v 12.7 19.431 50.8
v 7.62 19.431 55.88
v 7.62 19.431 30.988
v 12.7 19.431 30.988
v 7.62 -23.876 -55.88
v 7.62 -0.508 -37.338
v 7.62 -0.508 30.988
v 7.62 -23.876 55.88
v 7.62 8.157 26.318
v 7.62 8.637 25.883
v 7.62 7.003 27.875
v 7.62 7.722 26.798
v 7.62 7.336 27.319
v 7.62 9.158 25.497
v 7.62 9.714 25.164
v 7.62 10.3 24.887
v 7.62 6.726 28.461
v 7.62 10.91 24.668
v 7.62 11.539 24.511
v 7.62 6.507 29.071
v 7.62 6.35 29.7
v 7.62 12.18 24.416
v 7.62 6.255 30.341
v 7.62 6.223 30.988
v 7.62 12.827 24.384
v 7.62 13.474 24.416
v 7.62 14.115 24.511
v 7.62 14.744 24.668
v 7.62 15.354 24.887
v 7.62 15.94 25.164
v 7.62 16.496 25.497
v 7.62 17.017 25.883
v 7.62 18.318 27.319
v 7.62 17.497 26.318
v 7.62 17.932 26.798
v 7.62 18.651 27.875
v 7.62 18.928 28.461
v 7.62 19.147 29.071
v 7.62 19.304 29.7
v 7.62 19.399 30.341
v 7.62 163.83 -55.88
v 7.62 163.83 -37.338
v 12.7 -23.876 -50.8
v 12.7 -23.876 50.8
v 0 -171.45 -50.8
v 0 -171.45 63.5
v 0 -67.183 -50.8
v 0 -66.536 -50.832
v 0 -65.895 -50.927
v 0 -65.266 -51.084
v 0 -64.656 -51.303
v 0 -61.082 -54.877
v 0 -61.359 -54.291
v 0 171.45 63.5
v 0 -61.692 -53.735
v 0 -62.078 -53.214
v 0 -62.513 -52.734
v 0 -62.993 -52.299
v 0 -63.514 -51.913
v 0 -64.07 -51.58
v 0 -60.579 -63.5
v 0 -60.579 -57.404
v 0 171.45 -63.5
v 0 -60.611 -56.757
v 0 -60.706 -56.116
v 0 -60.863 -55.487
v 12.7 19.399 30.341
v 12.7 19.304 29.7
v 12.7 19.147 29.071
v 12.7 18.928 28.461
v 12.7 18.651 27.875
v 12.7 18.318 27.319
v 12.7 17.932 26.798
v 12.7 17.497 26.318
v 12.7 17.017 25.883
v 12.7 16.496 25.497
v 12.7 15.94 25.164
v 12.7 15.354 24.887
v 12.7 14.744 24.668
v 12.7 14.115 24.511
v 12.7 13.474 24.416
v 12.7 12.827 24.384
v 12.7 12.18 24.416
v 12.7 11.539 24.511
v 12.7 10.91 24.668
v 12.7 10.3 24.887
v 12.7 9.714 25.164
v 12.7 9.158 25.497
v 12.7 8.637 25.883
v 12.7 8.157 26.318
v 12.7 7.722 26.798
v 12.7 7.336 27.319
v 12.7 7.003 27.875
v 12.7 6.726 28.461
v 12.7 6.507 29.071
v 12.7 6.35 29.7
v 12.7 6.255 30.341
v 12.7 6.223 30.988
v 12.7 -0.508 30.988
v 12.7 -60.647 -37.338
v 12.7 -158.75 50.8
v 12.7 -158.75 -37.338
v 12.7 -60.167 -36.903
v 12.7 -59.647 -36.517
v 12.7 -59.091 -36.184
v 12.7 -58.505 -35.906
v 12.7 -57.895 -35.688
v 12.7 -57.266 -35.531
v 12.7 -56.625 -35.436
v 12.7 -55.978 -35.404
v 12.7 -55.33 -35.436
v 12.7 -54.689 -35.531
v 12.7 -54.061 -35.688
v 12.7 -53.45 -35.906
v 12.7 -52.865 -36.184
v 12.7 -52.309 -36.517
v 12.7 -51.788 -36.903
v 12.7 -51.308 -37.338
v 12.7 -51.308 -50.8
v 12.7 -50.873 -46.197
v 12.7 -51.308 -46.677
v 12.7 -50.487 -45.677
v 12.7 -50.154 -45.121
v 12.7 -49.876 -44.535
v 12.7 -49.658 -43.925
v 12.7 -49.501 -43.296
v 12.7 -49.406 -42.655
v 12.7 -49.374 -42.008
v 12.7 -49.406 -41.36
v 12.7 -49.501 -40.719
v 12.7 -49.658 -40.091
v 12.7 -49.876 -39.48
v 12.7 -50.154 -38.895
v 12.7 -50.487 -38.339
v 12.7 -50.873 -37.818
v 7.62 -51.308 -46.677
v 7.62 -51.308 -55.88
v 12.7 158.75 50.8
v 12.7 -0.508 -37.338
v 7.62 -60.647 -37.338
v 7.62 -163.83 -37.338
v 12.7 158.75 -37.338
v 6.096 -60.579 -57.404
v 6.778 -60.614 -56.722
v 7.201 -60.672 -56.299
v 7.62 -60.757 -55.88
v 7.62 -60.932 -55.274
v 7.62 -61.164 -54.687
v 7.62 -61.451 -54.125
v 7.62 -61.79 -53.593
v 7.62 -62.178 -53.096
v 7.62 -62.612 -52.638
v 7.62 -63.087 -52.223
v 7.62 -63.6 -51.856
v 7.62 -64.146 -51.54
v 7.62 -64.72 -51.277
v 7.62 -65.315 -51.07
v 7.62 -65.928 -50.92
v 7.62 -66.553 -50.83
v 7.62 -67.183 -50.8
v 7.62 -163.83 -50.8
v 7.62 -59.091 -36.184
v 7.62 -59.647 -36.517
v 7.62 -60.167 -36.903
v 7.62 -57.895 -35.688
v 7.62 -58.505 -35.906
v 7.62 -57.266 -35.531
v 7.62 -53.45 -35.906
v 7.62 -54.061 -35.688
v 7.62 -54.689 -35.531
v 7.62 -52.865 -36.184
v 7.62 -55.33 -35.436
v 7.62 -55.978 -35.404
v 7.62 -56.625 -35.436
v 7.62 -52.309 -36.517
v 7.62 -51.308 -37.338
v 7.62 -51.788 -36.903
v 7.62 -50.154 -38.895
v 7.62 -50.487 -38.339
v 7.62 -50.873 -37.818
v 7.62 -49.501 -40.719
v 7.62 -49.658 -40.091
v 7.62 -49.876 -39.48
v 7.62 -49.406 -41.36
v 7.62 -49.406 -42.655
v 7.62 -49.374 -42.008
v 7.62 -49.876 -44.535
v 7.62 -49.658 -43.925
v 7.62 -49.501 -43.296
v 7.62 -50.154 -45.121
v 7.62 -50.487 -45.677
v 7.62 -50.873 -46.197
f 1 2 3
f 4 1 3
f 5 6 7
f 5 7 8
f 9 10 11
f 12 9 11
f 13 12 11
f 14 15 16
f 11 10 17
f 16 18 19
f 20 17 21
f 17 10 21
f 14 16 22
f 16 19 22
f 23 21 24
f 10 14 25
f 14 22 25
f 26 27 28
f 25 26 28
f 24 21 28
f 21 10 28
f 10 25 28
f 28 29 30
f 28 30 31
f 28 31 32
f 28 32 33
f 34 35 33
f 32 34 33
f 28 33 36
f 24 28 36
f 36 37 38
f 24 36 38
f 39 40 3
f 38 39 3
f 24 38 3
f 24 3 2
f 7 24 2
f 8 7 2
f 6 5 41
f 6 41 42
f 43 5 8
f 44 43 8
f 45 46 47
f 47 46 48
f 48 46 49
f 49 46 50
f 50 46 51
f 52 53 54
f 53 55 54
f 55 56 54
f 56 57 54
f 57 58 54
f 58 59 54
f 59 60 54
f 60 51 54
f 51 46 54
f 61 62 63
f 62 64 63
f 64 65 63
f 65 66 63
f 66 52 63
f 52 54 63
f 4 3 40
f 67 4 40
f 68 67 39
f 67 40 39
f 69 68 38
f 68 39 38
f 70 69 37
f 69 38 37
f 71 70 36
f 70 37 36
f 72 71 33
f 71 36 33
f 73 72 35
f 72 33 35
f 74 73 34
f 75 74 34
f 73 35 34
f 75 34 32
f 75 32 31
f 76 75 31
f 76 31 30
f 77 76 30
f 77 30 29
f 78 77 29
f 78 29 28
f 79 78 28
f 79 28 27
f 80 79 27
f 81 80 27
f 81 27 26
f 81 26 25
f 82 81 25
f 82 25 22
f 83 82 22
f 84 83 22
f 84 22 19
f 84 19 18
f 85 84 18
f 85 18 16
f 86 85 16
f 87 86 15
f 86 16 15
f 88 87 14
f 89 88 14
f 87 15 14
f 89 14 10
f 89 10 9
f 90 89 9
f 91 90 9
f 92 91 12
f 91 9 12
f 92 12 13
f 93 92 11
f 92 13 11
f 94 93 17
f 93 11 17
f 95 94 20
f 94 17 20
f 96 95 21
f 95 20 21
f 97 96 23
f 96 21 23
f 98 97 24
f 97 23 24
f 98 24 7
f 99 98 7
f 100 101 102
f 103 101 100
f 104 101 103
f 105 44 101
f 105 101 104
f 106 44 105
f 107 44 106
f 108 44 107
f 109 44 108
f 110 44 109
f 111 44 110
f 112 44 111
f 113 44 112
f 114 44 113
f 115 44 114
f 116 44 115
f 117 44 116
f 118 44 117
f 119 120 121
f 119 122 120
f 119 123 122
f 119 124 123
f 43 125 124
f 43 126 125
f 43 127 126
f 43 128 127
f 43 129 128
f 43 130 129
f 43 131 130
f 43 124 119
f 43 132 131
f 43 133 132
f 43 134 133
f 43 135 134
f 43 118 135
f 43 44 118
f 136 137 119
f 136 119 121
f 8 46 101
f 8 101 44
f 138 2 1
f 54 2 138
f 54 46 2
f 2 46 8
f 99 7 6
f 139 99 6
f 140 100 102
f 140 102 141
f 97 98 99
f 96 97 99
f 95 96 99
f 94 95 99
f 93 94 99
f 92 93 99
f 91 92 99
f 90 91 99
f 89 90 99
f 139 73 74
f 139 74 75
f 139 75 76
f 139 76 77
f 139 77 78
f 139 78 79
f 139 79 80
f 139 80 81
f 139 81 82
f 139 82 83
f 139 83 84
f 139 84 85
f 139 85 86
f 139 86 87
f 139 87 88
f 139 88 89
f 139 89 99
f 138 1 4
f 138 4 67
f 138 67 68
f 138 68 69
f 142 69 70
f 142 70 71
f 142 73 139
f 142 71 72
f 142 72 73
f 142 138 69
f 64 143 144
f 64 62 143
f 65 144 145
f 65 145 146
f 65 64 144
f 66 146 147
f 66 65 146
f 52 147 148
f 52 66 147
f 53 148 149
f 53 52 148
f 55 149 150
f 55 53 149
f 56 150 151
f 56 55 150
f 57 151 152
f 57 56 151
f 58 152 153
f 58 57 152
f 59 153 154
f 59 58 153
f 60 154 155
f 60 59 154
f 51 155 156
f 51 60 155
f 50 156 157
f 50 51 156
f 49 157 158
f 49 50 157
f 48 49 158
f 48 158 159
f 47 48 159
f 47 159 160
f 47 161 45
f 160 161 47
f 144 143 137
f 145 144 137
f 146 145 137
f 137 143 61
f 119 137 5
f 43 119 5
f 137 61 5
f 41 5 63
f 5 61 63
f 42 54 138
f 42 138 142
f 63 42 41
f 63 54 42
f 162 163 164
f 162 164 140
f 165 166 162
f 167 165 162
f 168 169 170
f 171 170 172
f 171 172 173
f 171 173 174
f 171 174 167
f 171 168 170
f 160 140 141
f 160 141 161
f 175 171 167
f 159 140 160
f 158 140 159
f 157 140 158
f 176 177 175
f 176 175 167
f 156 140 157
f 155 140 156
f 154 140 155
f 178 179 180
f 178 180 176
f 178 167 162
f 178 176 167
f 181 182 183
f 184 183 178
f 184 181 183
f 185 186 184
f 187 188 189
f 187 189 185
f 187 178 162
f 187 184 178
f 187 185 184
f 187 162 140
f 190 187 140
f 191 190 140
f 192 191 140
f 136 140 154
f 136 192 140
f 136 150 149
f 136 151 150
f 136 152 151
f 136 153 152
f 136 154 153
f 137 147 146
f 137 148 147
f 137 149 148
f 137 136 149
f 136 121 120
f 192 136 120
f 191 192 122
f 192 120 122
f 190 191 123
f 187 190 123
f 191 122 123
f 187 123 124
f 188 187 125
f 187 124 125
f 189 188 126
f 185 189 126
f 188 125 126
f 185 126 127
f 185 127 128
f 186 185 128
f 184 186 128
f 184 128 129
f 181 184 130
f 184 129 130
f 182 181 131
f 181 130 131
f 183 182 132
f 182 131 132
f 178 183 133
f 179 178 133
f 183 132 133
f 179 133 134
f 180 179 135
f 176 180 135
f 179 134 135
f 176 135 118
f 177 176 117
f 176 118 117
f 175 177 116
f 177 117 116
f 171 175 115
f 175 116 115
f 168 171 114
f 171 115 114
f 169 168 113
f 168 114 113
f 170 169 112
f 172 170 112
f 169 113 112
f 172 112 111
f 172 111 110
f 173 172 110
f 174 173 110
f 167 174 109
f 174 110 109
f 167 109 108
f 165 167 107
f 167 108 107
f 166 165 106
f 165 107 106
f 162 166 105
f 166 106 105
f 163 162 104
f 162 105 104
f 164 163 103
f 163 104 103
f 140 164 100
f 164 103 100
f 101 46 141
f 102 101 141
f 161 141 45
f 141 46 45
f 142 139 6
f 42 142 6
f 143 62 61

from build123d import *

# Parameters (mm, degrees)
SKETCH1_W               = 127
SKETCH1_H               = 342.9
BOSS_EXTRUDE1_DEPTH     = 12.7
DRAFT1_ANGLE            = -45
CUT_EXTRUDE1_DEPTH      = 184.272045059
CUT_EXTRUDE1_DEPTH_BACK = 5.08
CUT_EXTRUDE2_DEPTH      = 5.08
SKETCH4_W               = 12.7
SKETCH4_H               = 110.871
CUT_EXTRUDE6_DEPTH      = 184.272045059
SKETCH5_W               = 26.162
SKETCH5_H               = 171.958
CUT_EXTRUDE7_DEPTH      = 5.08
FILLET1_R               = 6.604


with BuildPart() as part:
    # Sketch1 → Boss-Extrude1 (new body)
    with BuildSketch(Plane(origin=(0, 0, 0), x_dir=(0, 0, -1), z_dir=(1, 0, 0))):
        Rectangle(SKETCH1_W, SKETCH1_H)
    extrude(amount=BOSS_EXTRUDE1_DEPTH)

    # Draft1
    draft1_faces = [part.faces().sort_by_distance(p)[0] for p in [
        (6.35, -171.45, 0),
        (6.35, 0, -63.5),
        (6.35, 0, 63.5),
        (6.35, 171.45, 0),
    ]]
    draft(draft1_faces, Plane(origin=(0, 0, 0), x_dir=(0, 0, -1), z_dir=(-1, 0, 0)), DRAFT1_ANGLE)

    # Sketch2 → Cut-Extrude1 (cut, two sides: drawn at the far end of the back side and taken through both)
    with BuildSketch(Plane(origin=(12.7, 0, 0), x_dir=(0, 0, -1), z_dir=(1, 0, 0)).offset(-CUT_EXTRUDE1_DEPTH_BACK)):
        with BuildLine():
            Line((-63.5, 19.431), (-30.988, 19.431))
            ThreePointArc((-30.988, 19.431), (-24.384, 12.827), (-30.988, 6.223))
            Line((-30.988, 6.223), (-30.988, -0.508))
            Line((-30.988, -0.508), (63.5, -0.508))
            Line((63.5, -0.508), (63.5, -23.876))
            Line((63.5, -23.876), (-63.5, -23.876))
            Line((-63.5, -23.876), (-63.5, 19.431))
        make_face()
    extrude(amount=CUT_EXTRUDE1_DEPTH + CUT_EXTRUDE1_DEPTH_BACK, mode=Mode.SUBTRACT)

    # Sketch3 → Cut-Extrude2 (cut)
    with BuildSketch(Plane(origin=(12.7, 0, 0), x_dir=(0, 0, -1), z_dir=(1, 0, 0))):
        with BuildLine():
            Line((37.338, -171.45), (63.5, -171.45))
            Line((63.5, -171.45), (63.5, -51.308))
            Line((63.5, -51.308), (46.677466366, -51.308))
            ThreePointArc((46.677466366, -51.308), (37.338, -51.308), (37.338, -60.647466366))
            Line((37.338, -60.647466366), (37.338, -171.45))
        make_face()
    extrude(amount=-CUT_EXTRUDE2_DEPTH, mode=Mode.SUBTRACT)

    # Sketch4 → Cut-Extrude6 (cut, through all)
    with BuildSketch(Plane(origin=(12.7, 0, 0), x_dir=(0, 0, -1), z_dir=(1, 0, 0))):
        with Locations((57.15, -116.0145)):
            Rectangle(SKETCH4_W, SKETCH4_H)
    extrude(amount=-CUT_EXTRUDE6_DEPTH, mode=Mode.SUBTRACT)

    # Sketch5 → Cut-Extrude7 (cut)
    with BuildSketch(Plane(origin=(12.7, 0, 0), x_dir=(0, 0, -1), z_dir=(1, 0, 0))):
        with Locations((50.419, 85.471)):
            Rectangle(SKETCH5_W, SKETCH5_H)
    extrude(amount=-CUT_EXTRUDE7_DEPTH, mode=Mode.SUBTRACT)

    # Fillet1
    fillet1_edges = [part.edges().sort_by_distance(p)[0] for p in [
        (3.81, -60.579, -50.8),
    ]]
    fillet(fillet1_edges, radius=FILLET1_R)


solid = part.part
